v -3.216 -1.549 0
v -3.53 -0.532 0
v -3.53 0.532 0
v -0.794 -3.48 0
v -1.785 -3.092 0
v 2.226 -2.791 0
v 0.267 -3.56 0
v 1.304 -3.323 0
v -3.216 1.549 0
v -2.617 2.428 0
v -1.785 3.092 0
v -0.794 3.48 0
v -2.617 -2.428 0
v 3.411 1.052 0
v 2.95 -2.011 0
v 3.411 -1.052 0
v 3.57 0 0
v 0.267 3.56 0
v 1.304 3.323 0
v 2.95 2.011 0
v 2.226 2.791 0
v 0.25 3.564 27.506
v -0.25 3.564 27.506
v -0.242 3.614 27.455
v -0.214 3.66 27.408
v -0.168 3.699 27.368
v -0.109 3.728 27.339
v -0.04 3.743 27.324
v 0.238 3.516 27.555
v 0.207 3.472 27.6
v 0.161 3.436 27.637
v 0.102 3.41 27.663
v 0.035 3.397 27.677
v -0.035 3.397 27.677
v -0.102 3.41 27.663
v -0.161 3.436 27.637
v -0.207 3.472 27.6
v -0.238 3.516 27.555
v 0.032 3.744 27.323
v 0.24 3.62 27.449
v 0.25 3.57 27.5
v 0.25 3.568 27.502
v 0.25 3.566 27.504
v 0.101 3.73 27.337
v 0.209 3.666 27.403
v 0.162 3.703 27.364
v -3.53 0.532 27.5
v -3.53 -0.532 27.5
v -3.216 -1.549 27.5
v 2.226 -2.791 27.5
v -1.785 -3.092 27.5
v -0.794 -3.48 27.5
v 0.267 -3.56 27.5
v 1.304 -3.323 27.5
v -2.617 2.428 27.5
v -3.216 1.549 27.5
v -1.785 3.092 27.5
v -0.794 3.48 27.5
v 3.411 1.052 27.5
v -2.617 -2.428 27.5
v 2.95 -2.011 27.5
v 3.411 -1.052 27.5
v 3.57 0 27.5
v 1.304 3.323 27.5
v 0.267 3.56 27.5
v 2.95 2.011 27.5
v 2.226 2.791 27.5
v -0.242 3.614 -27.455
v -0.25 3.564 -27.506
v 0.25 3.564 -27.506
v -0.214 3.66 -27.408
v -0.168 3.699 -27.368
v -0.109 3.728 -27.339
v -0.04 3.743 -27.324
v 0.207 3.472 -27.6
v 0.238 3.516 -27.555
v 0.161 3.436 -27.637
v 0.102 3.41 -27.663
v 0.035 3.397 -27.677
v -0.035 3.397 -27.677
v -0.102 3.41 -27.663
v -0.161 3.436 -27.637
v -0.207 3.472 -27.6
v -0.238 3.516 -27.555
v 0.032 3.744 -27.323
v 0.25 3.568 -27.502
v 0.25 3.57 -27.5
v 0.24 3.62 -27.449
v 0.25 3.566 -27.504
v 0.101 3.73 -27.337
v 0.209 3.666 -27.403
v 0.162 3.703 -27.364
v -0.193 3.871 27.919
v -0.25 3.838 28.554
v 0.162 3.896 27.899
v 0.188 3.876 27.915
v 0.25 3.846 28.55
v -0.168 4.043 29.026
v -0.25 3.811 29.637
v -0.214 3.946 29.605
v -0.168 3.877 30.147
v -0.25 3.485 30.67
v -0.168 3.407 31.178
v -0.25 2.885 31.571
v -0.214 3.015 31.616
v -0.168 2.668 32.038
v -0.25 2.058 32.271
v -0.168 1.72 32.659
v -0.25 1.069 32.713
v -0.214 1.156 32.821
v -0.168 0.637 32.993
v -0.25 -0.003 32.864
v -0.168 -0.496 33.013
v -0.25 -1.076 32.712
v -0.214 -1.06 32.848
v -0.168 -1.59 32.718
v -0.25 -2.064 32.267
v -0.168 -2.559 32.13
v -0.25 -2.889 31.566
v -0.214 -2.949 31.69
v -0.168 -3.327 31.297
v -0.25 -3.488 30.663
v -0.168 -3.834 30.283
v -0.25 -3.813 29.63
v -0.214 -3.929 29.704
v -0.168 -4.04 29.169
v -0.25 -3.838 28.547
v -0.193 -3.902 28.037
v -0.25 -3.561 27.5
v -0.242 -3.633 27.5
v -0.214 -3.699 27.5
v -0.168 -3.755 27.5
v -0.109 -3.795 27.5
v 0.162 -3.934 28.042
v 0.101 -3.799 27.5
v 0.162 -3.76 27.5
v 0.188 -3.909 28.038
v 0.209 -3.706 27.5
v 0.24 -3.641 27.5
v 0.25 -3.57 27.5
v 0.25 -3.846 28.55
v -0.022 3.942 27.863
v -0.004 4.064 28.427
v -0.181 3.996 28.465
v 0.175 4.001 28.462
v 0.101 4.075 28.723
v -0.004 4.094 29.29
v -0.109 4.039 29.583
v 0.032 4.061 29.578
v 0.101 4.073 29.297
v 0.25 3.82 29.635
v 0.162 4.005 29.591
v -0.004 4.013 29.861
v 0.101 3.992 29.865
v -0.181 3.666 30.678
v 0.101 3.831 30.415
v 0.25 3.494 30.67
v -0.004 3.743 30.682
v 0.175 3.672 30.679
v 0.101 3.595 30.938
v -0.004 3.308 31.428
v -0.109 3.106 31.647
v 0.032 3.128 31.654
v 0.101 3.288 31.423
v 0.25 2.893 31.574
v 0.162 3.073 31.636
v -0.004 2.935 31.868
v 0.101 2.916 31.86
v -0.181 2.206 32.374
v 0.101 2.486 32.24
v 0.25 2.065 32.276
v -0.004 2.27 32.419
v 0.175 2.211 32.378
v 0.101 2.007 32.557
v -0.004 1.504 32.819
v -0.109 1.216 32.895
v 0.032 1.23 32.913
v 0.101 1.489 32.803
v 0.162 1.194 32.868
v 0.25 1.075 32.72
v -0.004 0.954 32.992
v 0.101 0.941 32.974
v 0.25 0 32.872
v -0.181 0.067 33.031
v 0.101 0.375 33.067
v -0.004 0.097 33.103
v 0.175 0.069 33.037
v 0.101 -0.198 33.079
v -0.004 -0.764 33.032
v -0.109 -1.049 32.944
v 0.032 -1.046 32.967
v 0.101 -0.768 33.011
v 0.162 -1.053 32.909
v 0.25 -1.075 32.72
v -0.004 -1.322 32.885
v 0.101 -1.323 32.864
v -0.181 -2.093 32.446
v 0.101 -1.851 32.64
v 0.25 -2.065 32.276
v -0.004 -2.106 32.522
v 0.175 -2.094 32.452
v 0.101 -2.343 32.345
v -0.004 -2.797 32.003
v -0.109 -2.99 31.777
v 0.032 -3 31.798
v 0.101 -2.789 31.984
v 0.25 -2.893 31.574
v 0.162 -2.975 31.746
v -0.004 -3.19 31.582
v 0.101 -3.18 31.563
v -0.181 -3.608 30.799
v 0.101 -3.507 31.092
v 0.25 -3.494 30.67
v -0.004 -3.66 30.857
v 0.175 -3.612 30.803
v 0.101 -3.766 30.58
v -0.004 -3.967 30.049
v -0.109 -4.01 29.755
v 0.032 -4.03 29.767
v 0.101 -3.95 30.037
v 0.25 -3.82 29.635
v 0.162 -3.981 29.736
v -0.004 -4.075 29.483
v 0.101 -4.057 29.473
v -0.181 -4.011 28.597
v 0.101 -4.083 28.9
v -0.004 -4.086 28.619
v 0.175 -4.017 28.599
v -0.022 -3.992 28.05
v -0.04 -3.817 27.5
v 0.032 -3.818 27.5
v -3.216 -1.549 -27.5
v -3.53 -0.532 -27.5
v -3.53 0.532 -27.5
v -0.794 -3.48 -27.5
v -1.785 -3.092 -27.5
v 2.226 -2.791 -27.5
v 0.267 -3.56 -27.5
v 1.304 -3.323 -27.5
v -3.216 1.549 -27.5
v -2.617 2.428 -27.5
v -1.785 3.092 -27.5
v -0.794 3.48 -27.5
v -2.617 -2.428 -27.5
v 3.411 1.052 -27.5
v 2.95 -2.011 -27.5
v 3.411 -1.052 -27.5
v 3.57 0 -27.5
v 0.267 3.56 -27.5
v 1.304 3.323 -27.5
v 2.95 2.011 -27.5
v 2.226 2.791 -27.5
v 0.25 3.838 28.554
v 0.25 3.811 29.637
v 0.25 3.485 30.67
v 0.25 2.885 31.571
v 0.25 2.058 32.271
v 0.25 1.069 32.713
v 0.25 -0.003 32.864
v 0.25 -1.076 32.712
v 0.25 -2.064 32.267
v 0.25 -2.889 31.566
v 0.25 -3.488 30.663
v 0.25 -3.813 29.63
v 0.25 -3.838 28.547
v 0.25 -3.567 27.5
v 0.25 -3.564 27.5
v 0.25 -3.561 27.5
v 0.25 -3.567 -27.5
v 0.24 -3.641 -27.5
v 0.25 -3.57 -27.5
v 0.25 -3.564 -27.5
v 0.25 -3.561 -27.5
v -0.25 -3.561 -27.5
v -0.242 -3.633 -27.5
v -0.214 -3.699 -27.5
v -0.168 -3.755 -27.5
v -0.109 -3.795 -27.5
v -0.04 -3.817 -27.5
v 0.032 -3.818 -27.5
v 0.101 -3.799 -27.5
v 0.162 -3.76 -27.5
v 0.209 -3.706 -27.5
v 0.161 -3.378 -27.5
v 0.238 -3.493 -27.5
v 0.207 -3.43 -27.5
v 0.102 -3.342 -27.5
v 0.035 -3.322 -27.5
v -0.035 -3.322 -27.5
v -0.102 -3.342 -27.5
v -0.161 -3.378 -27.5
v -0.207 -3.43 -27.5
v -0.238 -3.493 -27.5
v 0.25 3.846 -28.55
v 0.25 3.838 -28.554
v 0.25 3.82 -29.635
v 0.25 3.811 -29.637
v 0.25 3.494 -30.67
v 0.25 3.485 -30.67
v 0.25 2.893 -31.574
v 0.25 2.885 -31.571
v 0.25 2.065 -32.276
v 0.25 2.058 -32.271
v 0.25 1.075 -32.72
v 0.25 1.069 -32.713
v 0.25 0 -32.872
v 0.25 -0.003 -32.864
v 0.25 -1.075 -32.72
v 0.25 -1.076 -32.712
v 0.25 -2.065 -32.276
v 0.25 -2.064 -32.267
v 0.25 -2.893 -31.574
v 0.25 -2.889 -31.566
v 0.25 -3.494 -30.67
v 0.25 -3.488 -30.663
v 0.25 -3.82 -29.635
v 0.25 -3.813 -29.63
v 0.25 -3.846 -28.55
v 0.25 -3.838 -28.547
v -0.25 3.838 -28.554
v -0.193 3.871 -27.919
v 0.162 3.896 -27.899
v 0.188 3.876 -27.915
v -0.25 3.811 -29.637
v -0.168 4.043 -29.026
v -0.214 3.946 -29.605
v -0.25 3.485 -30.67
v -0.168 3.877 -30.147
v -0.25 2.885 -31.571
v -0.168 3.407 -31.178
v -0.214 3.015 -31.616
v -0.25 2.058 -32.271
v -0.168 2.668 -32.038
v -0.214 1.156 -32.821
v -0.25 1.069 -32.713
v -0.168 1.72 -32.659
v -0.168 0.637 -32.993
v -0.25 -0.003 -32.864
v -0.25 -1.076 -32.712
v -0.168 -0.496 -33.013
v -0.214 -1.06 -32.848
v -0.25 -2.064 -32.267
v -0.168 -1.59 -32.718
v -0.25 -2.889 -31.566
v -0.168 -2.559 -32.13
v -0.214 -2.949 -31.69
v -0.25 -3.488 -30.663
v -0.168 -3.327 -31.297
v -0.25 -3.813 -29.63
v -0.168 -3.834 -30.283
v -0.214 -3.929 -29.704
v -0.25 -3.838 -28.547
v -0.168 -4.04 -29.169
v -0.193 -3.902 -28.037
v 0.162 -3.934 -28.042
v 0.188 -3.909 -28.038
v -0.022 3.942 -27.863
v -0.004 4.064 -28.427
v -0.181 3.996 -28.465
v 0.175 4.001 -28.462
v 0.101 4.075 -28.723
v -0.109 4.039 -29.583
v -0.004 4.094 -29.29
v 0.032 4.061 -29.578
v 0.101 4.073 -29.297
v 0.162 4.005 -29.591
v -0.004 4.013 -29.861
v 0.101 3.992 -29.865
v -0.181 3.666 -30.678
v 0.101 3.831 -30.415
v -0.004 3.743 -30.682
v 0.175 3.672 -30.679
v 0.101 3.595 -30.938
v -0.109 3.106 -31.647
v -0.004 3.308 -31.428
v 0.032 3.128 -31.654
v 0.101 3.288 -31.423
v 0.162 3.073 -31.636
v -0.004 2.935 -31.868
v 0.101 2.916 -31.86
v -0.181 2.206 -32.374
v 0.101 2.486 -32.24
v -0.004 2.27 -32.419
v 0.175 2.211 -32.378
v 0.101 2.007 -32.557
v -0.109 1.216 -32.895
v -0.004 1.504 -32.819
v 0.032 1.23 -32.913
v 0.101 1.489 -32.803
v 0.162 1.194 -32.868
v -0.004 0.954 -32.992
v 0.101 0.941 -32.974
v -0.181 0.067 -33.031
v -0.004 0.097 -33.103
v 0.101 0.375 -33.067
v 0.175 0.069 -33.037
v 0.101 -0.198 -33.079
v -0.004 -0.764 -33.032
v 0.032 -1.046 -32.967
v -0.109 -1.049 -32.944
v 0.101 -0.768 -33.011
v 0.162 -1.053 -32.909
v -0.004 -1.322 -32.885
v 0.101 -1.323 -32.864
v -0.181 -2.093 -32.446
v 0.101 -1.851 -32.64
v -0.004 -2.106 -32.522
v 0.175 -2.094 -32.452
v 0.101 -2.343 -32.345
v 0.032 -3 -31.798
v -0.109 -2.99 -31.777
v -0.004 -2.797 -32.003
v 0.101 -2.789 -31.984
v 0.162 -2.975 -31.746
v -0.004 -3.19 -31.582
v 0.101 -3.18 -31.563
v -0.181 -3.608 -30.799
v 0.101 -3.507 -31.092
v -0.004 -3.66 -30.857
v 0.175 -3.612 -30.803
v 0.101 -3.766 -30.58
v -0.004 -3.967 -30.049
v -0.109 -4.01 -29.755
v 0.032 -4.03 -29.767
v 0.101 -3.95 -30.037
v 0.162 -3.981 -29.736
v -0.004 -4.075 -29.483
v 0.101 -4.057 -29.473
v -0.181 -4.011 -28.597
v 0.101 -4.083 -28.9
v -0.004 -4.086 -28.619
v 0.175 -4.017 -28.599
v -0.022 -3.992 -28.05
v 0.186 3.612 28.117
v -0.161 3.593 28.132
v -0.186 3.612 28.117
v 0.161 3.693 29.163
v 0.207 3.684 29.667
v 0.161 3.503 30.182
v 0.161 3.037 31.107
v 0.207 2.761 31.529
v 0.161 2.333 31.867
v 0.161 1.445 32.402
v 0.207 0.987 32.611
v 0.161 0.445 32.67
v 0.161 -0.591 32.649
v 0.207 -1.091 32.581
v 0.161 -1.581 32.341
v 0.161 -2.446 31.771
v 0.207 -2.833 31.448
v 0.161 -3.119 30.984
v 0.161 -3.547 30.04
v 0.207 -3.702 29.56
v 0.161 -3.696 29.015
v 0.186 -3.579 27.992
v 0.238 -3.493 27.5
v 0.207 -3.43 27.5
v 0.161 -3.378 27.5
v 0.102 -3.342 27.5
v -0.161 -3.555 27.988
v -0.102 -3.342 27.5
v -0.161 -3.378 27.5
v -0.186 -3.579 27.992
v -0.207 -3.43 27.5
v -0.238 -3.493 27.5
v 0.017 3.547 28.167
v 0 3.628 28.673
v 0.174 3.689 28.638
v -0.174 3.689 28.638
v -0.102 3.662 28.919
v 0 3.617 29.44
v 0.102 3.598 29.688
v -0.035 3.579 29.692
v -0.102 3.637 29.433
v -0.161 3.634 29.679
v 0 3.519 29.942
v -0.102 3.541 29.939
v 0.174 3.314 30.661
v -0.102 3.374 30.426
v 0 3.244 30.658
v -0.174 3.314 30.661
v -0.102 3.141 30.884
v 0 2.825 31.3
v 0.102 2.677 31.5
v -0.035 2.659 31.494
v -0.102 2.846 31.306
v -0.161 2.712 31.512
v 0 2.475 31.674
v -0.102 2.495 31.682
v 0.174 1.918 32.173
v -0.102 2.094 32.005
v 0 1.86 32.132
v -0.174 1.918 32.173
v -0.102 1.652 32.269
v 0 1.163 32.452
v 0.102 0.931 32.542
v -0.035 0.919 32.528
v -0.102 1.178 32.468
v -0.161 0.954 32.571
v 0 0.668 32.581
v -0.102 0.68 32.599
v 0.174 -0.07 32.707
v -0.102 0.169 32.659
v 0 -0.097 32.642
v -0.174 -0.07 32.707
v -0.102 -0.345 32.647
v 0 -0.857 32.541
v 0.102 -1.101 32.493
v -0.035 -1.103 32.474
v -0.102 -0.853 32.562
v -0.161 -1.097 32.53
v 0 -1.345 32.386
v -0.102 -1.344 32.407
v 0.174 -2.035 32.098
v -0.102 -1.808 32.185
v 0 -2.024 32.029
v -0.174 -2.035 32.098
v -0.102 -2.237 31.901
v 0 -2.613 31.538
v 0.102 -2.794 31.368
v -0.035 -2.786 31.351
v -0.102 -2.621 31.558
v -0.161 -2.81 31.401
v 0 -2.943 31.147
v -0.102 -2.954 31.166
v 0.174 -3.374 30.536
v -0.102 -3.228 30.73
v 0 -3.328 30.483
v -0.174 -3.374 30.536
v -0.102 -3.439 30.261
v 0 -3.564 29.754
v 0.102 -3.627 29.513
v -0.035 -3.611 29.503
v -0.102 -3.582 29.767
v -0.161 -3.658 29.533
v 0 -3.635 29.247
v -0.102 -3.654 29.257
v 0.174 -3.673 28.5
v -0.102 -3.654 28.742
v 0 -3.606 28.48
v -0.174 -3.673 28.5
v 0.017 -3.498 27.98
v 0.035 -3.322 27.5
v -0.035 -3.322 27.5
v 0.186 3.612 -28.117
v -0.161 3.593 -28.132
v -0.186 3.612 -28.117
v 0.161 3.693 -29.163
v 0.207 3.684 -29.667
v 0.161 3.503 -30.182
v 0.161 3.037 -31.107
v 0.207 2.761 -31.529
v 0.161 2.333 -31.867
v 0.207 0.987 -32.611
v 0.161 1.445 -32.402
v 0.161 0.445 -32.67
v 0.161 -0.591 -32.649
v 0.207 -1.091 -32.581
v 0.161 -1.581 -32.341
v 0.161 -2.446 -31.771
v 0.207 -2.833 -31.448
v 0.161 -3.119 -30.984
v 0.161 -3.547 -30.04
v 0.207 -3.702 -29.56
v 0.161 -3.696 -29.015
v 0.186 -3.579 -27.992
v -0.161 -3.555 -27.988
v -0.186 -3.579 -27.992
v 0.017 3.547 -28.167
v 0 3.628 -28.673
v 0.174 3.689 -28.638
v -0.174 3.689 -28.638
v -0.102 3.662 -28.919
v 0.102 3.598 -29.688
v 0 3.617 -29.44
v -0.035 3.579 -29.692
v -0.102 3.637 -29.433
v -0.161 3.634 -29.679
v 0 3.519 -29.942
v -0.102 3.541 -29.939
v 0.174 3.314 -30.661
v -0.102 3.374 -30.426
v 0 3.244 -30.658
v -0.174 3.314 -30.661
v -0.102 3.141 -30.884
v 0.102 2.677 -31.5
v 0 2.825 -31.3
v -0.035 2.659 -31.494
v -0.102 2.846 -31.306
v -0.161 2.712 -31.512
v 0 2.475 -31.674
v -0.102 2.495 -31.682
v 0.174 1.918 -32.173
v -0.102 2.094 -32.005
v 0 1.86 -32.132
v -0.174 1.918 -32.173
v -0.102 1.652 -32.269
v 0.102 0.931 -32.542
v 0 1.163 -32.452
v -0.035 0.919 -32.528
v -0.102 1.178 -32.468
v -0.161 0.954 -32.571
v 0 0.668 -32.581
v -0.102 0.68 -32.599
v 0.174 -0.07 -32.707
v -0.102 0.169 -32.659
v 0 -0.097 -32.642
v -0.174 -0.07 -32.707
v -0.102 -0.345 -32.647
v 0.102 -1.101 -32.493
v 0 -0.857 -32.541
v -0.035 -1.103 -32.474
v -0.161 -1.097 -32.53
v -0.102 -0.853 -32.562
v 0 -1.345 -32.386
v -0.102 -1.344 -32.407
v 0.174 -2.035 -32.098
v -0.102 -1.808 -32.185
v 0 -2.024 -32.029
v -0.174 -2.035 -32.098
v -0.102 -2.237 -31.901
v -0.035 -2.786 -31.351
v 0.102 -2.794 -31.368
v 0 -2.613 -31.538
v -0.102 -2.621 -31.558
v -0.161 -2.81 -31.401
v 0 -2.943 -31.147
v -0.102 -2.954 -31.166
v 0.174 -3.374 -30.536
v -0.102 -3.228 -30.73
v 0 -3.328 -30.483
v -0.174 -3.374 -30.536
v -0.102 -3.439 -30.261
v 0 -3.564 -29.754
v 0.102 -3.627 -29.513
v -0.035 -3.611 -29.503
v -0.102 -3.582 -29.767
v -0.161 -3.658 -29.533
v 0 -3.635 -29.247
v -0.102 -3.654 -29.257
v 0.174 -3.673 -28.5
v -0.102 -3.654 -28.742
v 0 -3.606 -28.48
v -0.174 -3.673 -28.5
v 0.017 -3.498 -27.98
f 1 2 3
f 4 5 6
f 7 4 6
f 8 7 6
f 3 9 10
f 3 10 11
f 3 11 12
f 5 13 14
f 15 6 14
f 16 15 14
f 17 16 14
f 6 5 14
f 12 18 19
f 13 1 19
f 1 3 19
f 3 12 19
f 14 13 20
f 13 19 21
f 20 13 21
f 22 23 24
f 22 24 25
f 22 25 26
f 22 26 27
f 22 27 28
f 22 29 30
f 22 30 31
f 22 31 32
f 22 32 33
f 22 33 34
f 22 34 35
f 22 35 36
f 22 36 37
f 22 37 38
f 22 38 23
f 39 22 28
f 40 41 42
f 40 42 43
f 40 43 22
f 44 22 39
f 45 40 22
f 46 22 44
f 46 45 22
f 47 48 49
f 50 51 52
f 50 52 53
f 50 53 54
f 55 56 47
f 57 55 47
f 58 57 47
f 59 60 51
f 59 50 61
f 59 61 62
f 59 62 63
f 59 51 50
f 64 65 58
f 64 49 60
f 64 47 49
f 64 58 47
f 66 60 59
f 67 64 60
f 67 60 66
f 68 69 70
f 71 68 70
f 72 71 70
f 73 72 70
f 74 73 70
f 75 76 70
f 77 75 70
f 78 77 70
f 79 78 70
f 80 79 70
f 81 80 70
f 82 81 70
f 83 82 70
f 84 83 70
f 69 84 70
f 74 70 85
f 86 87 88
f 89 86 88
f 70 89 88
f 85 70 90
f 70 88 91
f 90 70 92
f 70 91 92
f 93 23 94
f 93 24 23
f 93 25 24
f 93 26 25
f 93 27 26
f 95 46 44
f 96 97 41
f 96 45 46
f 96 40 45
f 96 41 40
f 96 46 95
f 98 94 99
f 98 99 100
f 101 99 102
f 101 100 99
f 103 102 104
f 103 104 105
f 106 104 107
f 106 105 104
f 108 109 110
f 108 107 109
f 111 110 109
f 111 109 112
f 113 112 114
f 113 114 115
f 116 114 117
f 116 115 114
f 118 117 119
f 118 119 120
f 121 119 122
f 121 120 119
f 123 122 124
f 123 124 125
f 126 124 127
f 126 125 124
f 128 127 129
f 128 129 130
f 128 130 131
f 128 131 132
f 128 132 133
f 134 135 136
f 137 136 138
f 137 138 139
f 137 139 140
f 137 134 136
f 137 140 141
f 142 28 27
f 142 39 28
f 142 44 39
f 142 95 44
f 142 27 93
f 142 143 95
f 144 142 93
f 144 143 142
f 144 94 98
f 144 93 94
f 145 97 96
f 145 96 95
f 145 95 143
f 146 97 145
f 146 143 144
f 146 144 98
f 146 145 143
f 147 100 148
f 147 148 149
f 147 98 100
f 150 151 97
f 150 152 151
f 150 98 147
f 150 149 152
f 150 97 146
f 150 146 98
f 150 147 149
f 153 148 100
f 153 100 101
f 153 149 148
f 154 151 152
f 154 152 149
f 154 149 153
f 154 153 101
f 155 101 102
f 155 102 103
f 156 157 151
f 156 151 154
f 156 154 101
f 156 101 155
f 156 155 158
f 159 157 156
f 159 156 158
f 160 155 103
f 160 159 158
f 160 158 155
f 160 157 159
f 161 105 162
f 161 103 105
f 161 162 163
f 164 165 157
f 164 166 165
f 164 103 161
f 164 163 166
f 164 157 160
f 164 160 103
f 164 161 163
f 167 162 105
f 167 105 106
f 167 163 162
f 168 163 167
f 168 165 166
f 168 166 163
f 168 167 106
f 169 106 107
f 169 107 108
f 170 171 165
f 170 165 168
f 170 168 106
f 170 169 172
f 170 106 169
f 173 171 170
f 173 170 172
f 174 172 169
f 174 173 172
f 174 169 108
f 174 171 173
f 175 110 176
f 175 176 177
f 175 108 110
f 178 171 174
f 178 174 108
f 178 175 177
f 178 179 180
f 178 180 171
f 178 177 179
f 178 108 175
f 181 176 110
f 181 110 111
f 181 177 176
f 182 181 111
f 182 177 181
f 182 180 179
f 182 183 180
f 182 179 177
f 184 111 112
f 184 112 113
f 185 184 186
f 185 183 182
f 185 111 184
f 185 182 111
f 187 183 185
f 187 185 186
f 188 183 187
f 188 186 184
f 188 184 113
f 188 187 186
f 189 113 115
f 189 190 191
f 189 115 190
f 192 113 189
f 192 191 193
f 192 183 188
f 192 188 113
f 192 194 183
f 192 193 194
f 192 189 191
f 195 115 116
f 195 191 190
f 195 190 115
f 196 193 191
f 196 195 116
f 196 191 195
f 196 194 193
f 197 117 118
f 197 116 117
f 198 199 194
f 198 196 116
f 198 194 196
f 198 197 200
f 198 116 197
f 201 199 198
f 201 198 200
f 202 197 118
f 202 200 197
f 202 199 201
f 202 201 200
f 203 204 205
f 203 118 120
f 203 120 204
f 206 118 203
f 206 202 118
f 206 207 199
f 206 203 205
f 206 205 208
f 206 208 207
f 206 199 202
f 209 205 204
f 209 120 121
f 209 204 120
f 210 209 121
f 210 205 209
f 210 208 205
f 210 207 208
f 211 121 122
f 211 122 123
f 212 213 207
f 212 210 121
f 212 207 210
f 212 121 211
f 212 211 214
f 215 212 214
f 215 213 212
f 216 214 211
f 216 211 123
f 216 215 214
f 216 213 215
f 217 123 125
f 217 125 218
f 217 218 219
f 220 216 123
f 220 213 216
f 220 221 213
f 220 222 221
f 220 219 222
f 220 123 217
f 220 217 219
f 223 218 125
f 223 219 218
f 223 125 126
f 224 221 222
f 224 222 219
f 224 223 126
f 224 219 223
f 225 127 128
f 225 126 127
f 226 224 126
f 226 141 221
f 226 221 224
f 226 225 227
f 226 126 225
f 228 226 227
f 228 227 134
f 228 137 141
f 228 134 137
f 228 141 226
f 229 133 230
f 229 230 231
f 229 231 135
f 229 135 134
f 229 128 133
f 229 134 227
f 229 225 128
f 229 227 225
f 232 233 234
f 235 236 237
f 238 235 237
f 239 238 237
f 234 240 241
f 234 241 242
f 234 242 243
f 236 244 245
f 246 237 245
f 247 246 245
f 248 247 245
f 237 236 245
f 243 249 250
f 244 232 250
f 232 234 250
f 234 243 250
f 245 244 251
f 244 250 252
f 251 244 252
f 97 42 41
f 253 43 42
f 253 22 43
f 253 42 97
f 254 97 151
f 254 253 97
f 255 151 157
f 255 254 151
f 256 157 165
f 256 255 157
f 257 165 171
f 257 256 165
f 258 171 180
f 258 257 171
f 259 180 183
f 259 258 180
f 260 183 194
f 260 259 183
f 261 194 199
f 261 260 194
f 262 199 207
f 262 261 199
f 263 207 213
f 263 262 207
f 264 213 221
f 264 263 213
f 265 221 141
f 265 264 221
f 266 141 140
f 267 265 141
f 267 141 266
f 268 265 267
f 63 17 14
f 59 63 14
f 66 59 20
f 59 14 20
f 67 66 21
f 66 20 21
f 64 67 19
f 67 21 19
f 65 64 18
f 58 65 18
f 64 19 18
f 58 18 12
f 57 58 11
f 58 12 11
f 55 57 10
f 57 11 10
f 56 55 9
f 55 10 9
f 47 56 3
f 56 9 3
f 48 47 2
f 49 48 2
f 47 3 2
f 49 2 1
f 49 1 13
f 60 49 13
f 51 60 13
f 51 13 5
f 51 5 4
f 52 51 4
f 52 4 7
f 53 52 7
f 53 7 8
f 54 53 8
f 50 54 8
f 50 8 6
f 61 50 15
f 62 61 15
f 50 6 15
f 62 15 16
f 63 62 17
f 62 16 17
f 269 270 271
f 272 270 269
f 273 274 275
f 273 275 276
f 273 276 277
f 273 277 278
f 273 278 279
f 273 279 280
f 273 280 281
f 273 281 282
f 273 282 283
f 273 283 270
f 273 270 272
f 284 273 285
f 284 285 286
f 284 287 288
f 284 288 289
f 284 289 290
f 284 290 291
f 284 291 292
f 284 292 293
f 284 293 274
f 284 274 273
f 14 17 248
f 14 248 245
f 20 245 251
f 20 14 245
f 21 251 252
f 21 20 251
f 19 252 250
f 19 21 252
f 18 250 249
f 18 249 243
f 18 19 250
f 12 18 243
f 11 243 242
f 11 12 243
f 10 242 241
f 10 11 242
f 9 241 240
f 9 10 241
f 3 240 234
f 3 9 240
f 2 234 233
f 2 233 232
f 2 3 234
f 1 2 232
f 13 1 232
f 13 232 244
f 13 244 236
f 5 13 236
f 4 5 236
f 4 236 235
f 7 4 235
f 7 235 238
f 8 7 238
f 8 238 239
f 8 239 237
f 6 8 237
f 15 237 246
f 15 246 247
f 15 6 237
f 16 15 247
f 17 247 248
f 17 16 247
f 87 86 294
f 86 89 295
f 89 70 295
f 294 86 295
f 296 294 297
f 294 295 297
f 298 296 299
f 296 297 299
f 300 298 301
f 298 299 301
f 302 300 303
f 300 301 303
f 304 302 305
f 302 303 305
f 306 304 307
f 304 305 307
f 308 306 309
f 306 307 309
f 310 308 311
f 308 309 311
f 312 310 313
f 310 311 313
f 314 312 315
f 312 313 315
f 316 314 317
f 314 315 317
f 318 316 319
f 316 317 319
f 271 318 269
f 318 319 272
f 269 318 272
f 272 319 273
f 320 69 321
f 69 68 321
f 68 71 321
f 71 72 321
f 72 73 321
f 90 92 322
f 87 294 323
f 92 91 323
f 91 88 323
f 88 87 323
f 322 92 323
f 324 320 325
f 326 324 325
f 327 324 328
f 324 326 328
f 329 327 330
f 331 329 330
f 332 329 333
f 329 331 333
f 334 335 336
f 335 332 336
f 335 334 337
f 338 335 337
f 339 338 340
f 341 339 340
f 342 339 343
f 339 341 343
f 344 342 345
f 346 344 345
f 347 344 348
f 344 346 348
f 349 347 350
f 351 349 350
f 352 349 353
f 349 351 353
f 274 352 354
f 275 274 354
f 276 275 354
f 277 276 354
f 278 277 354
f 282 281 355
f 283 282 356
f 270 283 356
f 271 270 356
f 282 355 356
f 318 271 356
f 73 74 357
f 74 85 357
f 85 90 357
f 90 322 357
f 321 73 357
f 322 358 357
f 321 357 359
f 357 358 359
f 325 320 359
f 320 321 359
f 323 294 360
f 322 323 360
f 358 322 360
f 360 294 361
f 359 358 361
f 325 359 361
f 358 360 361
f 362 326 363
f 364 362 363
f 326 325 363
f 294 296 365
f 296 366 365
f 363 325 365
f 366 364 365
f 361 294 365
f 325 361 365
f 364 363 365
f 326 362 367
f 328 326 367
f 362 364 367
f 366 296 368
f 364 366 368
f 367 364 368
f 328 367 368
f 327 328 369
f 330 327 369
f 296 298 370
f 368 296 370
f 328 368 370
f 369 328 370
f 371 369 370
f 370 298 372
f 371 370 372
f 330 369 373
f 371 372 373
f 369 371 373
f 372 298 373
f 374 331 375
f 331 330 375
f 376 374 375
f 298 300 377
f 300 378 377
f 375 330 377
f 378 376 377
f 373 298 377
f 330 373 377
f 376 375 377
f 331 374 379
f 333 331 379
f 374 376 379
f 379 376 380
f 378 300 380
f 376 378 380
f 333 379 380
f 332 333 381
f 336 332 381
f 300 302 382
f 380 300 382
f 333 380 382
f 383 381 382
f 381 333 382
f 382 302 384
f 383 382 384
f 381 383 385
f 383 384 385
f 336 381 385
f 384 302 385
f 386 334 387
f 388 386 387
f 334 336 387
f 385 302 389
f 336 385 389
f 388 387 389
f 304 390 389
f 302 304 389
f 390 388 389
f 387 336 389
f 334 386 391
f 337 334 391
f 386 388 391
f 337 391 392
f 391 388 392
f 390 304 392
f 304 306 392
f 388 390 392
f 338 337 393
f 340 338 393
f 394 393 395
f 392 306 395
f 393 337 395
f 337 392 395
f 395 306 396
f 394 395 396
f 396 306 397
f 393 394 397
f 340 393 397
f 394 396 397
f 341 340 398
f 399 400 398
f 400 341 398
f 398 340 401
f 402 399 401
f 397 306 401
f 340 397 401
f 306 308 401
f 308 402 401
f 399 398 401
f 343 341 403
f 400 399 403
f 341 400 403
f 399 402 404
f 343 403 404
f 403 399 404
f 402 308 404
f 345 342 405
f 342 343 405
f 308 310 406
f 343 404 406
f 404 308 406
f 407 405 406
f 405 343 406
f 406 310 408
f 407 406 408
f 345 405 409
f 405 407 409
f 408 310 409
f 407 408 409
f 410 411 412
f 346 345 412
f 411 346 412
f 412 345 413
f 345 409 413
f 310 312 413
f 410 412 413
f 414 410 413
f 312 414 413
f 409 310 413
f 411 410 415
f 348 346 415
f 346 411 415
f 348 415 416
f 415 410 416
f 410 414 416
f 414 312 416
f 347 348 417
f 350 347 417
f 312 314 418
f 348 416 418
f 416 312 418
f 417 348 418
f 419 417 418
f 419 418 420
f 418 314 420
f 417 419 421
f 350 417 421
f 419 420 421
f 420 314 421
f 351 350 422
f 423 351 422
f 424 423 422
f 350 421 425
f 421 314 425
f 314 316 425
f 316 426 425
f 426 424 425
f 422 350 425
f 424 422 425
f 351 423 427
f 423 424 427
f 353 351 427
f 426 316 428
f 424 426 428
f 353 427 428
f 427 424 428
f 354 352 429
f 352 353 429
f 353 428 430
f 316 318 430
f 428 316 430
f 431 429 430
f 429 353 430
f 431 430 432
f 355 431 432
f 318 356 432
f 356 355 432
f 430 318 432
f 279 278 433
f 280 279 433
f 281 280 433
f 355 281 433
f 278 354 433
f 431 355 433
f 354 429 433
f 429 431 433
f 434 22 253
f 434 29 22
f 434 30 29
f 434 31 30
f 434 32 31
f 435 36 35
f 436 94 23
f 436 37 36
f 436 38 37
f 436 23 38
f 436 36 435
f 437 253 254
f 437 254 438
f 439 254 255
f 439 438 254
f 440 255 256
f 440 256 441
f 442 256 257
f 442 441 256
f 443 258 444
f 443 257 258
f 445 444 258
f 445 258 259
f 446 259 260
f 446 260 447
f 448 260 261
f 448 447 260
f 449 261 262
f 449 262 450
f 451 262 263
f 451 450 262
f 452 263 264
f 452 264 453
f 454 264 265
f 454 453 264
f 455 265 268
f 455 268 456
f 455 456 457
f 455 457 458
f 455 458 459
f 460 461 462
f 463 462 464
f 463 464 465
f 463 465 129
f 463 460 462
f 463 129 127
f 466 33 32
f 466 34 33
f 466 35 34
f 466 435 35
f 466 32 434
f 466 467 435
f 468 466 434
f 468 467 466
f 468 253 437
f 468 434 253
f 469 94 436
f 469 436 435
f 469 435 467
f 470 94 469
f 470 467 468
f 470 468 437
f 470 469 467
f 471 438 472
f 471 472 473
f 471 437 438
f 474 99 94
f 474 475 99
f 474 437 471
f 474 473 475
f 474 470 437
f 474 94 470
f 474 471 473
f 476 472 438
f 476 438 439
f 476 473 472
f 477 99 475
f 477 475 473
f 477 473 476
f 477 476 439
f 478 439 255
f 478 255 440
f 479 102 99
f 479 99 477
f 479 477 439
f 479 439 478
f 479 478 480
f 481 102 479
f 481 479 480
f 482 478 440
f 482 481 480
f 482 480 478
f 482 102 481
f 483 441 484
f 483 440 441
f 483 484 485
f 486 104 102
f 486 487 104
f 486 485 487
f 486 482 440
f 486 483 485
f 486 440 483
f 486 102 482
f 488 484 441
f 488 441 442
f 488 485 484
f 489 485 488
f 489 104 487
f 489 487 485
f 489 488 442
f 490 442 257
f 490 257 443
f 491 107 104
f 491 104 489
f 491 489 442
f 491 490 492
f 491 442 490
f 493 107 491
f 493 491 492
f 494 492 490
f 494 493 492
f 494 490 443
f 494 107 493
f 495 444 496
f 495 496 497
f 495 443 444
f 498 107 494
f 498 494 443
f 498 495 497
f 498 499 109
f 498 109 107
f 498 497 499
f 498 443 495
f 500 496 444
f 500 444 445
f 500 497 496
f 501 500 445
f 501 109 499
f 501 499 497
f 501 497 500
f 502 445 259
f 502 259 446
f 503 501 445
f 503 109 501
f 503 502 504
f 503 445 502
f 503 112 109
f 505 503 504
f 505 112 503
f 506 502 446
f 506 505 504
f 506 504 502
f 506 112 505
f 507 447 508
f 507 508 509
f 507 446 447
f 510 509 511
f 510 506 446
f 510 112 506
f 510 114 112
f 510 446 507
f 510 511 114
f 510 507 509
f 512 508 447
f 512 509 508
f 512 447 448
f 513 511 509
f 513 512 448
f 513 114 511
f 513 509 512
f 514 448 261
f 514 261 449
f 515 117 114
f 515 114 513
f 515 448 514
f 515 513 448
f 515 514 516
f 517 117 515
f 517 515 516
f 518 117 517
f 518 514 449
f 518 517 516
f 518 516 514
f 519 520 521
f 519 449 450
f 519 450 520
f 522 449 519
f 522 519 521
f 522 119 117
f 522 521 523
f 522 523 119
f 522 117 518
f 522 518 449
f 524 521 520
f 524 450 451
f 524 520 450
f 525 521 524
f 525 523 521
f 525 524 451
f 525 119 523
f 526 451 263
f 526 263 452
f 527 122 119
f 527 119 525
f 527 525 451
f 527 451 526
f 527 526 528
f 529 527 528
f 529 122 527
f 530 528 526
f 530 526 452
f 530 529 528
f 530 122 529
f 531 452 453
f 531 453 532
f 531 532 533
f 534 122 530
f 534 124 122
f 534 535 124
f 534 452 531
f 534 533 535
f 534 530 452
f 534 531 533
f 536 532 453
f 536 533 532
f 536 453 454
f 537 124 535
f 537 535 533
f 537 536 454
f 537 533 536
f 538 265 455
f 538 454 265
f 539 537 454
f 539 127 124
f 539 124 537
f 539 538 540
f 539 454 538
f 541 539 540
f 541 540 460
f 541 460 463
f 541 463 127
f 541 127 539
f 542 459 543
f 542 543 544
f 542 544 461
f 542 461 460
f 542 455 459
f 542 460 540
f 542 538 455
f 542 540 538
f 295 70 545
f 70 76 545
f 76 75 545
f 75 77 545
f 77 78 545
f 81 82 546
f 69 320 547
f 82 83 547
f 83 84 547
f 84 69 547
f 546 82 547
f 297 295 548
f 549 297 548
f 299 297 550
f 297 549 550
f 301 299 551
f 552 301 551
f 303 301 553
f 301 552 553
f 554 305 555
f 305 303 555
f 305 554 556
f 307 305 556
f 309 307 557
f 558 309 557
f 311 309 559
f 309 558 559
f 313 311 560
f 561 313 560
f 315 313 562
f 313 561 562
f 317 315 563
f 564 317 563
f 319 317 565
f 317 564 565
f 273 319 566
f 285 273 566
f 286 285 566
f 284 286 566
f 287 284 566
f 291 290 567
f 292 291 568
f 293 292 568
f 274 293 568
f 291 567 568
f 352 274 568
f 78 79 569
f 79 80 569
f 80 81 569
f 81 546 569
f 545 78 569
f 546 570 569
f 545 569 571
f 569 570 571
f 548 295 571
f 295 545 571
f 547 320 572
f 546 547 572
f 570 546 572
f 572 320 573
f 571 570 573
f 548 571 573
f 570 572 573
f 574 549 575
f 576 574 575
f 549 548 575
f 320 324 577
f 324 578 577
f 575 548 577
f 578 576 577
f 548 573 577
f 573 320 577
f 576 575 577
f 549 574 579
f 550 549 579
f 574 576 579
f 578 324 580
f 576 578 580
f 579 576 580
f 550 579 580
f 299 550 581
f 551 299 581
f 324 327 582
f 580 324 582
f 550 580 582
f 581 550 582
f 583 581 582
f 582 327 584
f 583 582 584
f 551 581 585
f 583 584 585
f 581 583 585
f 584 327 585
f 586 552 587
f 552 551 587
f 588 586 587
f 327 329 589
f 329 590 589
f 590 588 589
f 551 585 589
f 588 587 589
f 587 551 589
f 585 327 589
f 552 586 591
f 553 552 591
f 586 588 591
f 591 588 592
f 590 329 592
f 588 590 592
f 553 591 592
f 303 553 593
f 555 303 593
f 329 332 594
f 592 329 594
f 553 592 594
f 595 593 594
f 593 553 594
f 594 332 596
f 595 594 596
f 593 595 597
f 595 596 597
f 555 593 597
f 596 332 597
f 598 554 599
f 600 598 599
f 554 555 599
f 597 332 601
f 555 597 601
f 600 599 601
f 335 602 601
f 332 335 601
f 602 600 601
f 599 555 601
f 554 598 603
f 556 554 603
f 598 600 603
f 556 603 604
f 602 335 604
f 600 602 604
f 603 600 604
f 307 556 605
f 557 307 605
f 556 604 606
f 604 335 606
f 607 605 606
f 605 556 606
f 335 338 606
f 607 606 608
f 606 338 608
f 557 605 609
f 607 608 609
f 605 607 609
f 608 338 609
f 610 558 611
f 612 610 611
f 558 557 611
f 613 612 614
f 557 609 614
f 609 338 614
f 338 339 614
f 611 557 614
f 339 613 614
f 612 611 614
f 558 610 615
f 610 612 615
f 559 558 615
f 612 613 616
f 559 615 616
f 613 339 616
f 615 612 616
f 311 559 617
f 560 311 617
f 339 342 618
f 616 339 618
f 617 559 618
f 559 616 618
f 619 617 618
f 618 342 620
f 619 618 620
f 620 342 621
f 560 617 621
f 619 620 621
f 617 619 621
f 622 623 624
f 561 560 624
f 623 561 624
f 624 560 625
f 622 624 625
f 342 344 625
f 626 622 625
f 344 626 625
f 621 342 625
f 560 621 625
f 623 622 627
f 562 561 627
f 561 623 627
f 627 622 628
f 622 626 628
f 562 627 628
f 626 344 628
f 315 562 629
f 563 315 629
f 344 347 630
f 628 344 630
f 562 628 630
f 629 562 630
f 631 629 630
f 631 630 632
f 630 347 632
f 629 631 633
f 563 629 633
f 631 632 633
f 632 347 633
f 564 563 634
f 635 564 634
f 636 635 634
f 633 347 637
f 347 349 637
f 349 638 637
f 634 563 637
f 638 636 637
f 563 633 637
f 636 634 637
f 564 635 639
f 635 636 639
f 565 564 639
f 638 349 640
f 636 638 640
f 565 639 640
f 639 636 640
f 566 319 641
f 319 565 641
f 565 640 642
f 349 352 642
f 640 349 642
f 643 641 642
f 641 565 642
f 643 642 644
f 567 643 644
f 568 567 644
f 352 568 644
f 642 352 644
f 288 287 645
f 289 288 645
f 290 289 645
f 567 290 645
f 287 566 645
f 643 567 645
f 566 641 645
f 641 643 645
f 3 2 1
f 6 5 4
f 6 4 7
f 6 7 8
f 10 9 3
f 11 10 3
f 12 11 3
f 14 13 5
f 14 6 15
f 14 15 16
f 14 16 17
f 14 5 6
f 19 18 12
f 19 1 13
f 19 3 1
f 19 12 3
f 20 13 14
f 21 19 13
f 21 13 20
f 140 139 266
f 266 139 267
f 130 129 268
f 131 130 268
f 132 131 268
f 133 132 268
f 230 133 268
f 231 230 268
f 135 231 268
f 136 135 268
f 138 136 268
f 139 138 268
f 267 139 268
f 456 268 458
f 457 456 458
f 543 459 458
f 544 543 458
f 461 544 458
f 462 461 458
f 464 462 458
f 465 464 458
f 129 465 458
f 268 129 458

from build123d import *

# Parameters (mm, degrees)
F0_R     = 3.57
F1_DEPTH = 27.5


# Not quite as in the source:
# - the program builds the solid bodies; features that only make, move or delete a surface that nothing else refers to are left out


with BuildPart() as f1:
    # F0 (on Top) → F1 (new body)
    with BuildSketch(Plane.XY):
        Circle(F0_R)
    extrude(amount=F1_DEPTH)


with BuildPart() as f4:
    # F4: sweep along a path in F2
    with BuildLine(Plane.YZ) as f4_path:
        ThreePointArc((3.57, 27.5), (0, 32.8723248831), (-3.57, 27.5))
    # F3 (on face) → F4 (sweep)
    with BuildSketch(Plane.XY.offset(27.5)):
        with BuildLine():
            ThreePointArc((-0.2498467054, -3.5612464986), (-0.0043774218, -3.8199616734), (0.25, -3.57))
            ThreePointArc((0.25, -3.57), (0.2499616734, -3.5656225782), (0.2498467054, -3.5612464986))
            ThreePointArc((0.2498467054, -3.5612464986), (0, -3.57), (-0.2498467054, -3.5612464986))
        make_face()
        with BuildLine():
            ThreePointArc((-0.2498467054, -3.5612464986), (0, -3.57), (0.2498467054, -3.5612464986))
            ThreePointArc((0.2498467054, -3.5612464986), (0, -3.32), (-0.2498467054, -3.5612464986))
        make_face()
    sweep(path=f4_path.line)


with BuildPart() as f5_1:
    # F5: instance of F4
    add(f4.part.mirror(Plane.XY))


with BuildPart() as f5_2:
    # F5: instance of F1
    add(f1.part.mirror(Plane.XY))


solid = Compound([f1.part, f4.part, f5_1.part, f5_2.part])
